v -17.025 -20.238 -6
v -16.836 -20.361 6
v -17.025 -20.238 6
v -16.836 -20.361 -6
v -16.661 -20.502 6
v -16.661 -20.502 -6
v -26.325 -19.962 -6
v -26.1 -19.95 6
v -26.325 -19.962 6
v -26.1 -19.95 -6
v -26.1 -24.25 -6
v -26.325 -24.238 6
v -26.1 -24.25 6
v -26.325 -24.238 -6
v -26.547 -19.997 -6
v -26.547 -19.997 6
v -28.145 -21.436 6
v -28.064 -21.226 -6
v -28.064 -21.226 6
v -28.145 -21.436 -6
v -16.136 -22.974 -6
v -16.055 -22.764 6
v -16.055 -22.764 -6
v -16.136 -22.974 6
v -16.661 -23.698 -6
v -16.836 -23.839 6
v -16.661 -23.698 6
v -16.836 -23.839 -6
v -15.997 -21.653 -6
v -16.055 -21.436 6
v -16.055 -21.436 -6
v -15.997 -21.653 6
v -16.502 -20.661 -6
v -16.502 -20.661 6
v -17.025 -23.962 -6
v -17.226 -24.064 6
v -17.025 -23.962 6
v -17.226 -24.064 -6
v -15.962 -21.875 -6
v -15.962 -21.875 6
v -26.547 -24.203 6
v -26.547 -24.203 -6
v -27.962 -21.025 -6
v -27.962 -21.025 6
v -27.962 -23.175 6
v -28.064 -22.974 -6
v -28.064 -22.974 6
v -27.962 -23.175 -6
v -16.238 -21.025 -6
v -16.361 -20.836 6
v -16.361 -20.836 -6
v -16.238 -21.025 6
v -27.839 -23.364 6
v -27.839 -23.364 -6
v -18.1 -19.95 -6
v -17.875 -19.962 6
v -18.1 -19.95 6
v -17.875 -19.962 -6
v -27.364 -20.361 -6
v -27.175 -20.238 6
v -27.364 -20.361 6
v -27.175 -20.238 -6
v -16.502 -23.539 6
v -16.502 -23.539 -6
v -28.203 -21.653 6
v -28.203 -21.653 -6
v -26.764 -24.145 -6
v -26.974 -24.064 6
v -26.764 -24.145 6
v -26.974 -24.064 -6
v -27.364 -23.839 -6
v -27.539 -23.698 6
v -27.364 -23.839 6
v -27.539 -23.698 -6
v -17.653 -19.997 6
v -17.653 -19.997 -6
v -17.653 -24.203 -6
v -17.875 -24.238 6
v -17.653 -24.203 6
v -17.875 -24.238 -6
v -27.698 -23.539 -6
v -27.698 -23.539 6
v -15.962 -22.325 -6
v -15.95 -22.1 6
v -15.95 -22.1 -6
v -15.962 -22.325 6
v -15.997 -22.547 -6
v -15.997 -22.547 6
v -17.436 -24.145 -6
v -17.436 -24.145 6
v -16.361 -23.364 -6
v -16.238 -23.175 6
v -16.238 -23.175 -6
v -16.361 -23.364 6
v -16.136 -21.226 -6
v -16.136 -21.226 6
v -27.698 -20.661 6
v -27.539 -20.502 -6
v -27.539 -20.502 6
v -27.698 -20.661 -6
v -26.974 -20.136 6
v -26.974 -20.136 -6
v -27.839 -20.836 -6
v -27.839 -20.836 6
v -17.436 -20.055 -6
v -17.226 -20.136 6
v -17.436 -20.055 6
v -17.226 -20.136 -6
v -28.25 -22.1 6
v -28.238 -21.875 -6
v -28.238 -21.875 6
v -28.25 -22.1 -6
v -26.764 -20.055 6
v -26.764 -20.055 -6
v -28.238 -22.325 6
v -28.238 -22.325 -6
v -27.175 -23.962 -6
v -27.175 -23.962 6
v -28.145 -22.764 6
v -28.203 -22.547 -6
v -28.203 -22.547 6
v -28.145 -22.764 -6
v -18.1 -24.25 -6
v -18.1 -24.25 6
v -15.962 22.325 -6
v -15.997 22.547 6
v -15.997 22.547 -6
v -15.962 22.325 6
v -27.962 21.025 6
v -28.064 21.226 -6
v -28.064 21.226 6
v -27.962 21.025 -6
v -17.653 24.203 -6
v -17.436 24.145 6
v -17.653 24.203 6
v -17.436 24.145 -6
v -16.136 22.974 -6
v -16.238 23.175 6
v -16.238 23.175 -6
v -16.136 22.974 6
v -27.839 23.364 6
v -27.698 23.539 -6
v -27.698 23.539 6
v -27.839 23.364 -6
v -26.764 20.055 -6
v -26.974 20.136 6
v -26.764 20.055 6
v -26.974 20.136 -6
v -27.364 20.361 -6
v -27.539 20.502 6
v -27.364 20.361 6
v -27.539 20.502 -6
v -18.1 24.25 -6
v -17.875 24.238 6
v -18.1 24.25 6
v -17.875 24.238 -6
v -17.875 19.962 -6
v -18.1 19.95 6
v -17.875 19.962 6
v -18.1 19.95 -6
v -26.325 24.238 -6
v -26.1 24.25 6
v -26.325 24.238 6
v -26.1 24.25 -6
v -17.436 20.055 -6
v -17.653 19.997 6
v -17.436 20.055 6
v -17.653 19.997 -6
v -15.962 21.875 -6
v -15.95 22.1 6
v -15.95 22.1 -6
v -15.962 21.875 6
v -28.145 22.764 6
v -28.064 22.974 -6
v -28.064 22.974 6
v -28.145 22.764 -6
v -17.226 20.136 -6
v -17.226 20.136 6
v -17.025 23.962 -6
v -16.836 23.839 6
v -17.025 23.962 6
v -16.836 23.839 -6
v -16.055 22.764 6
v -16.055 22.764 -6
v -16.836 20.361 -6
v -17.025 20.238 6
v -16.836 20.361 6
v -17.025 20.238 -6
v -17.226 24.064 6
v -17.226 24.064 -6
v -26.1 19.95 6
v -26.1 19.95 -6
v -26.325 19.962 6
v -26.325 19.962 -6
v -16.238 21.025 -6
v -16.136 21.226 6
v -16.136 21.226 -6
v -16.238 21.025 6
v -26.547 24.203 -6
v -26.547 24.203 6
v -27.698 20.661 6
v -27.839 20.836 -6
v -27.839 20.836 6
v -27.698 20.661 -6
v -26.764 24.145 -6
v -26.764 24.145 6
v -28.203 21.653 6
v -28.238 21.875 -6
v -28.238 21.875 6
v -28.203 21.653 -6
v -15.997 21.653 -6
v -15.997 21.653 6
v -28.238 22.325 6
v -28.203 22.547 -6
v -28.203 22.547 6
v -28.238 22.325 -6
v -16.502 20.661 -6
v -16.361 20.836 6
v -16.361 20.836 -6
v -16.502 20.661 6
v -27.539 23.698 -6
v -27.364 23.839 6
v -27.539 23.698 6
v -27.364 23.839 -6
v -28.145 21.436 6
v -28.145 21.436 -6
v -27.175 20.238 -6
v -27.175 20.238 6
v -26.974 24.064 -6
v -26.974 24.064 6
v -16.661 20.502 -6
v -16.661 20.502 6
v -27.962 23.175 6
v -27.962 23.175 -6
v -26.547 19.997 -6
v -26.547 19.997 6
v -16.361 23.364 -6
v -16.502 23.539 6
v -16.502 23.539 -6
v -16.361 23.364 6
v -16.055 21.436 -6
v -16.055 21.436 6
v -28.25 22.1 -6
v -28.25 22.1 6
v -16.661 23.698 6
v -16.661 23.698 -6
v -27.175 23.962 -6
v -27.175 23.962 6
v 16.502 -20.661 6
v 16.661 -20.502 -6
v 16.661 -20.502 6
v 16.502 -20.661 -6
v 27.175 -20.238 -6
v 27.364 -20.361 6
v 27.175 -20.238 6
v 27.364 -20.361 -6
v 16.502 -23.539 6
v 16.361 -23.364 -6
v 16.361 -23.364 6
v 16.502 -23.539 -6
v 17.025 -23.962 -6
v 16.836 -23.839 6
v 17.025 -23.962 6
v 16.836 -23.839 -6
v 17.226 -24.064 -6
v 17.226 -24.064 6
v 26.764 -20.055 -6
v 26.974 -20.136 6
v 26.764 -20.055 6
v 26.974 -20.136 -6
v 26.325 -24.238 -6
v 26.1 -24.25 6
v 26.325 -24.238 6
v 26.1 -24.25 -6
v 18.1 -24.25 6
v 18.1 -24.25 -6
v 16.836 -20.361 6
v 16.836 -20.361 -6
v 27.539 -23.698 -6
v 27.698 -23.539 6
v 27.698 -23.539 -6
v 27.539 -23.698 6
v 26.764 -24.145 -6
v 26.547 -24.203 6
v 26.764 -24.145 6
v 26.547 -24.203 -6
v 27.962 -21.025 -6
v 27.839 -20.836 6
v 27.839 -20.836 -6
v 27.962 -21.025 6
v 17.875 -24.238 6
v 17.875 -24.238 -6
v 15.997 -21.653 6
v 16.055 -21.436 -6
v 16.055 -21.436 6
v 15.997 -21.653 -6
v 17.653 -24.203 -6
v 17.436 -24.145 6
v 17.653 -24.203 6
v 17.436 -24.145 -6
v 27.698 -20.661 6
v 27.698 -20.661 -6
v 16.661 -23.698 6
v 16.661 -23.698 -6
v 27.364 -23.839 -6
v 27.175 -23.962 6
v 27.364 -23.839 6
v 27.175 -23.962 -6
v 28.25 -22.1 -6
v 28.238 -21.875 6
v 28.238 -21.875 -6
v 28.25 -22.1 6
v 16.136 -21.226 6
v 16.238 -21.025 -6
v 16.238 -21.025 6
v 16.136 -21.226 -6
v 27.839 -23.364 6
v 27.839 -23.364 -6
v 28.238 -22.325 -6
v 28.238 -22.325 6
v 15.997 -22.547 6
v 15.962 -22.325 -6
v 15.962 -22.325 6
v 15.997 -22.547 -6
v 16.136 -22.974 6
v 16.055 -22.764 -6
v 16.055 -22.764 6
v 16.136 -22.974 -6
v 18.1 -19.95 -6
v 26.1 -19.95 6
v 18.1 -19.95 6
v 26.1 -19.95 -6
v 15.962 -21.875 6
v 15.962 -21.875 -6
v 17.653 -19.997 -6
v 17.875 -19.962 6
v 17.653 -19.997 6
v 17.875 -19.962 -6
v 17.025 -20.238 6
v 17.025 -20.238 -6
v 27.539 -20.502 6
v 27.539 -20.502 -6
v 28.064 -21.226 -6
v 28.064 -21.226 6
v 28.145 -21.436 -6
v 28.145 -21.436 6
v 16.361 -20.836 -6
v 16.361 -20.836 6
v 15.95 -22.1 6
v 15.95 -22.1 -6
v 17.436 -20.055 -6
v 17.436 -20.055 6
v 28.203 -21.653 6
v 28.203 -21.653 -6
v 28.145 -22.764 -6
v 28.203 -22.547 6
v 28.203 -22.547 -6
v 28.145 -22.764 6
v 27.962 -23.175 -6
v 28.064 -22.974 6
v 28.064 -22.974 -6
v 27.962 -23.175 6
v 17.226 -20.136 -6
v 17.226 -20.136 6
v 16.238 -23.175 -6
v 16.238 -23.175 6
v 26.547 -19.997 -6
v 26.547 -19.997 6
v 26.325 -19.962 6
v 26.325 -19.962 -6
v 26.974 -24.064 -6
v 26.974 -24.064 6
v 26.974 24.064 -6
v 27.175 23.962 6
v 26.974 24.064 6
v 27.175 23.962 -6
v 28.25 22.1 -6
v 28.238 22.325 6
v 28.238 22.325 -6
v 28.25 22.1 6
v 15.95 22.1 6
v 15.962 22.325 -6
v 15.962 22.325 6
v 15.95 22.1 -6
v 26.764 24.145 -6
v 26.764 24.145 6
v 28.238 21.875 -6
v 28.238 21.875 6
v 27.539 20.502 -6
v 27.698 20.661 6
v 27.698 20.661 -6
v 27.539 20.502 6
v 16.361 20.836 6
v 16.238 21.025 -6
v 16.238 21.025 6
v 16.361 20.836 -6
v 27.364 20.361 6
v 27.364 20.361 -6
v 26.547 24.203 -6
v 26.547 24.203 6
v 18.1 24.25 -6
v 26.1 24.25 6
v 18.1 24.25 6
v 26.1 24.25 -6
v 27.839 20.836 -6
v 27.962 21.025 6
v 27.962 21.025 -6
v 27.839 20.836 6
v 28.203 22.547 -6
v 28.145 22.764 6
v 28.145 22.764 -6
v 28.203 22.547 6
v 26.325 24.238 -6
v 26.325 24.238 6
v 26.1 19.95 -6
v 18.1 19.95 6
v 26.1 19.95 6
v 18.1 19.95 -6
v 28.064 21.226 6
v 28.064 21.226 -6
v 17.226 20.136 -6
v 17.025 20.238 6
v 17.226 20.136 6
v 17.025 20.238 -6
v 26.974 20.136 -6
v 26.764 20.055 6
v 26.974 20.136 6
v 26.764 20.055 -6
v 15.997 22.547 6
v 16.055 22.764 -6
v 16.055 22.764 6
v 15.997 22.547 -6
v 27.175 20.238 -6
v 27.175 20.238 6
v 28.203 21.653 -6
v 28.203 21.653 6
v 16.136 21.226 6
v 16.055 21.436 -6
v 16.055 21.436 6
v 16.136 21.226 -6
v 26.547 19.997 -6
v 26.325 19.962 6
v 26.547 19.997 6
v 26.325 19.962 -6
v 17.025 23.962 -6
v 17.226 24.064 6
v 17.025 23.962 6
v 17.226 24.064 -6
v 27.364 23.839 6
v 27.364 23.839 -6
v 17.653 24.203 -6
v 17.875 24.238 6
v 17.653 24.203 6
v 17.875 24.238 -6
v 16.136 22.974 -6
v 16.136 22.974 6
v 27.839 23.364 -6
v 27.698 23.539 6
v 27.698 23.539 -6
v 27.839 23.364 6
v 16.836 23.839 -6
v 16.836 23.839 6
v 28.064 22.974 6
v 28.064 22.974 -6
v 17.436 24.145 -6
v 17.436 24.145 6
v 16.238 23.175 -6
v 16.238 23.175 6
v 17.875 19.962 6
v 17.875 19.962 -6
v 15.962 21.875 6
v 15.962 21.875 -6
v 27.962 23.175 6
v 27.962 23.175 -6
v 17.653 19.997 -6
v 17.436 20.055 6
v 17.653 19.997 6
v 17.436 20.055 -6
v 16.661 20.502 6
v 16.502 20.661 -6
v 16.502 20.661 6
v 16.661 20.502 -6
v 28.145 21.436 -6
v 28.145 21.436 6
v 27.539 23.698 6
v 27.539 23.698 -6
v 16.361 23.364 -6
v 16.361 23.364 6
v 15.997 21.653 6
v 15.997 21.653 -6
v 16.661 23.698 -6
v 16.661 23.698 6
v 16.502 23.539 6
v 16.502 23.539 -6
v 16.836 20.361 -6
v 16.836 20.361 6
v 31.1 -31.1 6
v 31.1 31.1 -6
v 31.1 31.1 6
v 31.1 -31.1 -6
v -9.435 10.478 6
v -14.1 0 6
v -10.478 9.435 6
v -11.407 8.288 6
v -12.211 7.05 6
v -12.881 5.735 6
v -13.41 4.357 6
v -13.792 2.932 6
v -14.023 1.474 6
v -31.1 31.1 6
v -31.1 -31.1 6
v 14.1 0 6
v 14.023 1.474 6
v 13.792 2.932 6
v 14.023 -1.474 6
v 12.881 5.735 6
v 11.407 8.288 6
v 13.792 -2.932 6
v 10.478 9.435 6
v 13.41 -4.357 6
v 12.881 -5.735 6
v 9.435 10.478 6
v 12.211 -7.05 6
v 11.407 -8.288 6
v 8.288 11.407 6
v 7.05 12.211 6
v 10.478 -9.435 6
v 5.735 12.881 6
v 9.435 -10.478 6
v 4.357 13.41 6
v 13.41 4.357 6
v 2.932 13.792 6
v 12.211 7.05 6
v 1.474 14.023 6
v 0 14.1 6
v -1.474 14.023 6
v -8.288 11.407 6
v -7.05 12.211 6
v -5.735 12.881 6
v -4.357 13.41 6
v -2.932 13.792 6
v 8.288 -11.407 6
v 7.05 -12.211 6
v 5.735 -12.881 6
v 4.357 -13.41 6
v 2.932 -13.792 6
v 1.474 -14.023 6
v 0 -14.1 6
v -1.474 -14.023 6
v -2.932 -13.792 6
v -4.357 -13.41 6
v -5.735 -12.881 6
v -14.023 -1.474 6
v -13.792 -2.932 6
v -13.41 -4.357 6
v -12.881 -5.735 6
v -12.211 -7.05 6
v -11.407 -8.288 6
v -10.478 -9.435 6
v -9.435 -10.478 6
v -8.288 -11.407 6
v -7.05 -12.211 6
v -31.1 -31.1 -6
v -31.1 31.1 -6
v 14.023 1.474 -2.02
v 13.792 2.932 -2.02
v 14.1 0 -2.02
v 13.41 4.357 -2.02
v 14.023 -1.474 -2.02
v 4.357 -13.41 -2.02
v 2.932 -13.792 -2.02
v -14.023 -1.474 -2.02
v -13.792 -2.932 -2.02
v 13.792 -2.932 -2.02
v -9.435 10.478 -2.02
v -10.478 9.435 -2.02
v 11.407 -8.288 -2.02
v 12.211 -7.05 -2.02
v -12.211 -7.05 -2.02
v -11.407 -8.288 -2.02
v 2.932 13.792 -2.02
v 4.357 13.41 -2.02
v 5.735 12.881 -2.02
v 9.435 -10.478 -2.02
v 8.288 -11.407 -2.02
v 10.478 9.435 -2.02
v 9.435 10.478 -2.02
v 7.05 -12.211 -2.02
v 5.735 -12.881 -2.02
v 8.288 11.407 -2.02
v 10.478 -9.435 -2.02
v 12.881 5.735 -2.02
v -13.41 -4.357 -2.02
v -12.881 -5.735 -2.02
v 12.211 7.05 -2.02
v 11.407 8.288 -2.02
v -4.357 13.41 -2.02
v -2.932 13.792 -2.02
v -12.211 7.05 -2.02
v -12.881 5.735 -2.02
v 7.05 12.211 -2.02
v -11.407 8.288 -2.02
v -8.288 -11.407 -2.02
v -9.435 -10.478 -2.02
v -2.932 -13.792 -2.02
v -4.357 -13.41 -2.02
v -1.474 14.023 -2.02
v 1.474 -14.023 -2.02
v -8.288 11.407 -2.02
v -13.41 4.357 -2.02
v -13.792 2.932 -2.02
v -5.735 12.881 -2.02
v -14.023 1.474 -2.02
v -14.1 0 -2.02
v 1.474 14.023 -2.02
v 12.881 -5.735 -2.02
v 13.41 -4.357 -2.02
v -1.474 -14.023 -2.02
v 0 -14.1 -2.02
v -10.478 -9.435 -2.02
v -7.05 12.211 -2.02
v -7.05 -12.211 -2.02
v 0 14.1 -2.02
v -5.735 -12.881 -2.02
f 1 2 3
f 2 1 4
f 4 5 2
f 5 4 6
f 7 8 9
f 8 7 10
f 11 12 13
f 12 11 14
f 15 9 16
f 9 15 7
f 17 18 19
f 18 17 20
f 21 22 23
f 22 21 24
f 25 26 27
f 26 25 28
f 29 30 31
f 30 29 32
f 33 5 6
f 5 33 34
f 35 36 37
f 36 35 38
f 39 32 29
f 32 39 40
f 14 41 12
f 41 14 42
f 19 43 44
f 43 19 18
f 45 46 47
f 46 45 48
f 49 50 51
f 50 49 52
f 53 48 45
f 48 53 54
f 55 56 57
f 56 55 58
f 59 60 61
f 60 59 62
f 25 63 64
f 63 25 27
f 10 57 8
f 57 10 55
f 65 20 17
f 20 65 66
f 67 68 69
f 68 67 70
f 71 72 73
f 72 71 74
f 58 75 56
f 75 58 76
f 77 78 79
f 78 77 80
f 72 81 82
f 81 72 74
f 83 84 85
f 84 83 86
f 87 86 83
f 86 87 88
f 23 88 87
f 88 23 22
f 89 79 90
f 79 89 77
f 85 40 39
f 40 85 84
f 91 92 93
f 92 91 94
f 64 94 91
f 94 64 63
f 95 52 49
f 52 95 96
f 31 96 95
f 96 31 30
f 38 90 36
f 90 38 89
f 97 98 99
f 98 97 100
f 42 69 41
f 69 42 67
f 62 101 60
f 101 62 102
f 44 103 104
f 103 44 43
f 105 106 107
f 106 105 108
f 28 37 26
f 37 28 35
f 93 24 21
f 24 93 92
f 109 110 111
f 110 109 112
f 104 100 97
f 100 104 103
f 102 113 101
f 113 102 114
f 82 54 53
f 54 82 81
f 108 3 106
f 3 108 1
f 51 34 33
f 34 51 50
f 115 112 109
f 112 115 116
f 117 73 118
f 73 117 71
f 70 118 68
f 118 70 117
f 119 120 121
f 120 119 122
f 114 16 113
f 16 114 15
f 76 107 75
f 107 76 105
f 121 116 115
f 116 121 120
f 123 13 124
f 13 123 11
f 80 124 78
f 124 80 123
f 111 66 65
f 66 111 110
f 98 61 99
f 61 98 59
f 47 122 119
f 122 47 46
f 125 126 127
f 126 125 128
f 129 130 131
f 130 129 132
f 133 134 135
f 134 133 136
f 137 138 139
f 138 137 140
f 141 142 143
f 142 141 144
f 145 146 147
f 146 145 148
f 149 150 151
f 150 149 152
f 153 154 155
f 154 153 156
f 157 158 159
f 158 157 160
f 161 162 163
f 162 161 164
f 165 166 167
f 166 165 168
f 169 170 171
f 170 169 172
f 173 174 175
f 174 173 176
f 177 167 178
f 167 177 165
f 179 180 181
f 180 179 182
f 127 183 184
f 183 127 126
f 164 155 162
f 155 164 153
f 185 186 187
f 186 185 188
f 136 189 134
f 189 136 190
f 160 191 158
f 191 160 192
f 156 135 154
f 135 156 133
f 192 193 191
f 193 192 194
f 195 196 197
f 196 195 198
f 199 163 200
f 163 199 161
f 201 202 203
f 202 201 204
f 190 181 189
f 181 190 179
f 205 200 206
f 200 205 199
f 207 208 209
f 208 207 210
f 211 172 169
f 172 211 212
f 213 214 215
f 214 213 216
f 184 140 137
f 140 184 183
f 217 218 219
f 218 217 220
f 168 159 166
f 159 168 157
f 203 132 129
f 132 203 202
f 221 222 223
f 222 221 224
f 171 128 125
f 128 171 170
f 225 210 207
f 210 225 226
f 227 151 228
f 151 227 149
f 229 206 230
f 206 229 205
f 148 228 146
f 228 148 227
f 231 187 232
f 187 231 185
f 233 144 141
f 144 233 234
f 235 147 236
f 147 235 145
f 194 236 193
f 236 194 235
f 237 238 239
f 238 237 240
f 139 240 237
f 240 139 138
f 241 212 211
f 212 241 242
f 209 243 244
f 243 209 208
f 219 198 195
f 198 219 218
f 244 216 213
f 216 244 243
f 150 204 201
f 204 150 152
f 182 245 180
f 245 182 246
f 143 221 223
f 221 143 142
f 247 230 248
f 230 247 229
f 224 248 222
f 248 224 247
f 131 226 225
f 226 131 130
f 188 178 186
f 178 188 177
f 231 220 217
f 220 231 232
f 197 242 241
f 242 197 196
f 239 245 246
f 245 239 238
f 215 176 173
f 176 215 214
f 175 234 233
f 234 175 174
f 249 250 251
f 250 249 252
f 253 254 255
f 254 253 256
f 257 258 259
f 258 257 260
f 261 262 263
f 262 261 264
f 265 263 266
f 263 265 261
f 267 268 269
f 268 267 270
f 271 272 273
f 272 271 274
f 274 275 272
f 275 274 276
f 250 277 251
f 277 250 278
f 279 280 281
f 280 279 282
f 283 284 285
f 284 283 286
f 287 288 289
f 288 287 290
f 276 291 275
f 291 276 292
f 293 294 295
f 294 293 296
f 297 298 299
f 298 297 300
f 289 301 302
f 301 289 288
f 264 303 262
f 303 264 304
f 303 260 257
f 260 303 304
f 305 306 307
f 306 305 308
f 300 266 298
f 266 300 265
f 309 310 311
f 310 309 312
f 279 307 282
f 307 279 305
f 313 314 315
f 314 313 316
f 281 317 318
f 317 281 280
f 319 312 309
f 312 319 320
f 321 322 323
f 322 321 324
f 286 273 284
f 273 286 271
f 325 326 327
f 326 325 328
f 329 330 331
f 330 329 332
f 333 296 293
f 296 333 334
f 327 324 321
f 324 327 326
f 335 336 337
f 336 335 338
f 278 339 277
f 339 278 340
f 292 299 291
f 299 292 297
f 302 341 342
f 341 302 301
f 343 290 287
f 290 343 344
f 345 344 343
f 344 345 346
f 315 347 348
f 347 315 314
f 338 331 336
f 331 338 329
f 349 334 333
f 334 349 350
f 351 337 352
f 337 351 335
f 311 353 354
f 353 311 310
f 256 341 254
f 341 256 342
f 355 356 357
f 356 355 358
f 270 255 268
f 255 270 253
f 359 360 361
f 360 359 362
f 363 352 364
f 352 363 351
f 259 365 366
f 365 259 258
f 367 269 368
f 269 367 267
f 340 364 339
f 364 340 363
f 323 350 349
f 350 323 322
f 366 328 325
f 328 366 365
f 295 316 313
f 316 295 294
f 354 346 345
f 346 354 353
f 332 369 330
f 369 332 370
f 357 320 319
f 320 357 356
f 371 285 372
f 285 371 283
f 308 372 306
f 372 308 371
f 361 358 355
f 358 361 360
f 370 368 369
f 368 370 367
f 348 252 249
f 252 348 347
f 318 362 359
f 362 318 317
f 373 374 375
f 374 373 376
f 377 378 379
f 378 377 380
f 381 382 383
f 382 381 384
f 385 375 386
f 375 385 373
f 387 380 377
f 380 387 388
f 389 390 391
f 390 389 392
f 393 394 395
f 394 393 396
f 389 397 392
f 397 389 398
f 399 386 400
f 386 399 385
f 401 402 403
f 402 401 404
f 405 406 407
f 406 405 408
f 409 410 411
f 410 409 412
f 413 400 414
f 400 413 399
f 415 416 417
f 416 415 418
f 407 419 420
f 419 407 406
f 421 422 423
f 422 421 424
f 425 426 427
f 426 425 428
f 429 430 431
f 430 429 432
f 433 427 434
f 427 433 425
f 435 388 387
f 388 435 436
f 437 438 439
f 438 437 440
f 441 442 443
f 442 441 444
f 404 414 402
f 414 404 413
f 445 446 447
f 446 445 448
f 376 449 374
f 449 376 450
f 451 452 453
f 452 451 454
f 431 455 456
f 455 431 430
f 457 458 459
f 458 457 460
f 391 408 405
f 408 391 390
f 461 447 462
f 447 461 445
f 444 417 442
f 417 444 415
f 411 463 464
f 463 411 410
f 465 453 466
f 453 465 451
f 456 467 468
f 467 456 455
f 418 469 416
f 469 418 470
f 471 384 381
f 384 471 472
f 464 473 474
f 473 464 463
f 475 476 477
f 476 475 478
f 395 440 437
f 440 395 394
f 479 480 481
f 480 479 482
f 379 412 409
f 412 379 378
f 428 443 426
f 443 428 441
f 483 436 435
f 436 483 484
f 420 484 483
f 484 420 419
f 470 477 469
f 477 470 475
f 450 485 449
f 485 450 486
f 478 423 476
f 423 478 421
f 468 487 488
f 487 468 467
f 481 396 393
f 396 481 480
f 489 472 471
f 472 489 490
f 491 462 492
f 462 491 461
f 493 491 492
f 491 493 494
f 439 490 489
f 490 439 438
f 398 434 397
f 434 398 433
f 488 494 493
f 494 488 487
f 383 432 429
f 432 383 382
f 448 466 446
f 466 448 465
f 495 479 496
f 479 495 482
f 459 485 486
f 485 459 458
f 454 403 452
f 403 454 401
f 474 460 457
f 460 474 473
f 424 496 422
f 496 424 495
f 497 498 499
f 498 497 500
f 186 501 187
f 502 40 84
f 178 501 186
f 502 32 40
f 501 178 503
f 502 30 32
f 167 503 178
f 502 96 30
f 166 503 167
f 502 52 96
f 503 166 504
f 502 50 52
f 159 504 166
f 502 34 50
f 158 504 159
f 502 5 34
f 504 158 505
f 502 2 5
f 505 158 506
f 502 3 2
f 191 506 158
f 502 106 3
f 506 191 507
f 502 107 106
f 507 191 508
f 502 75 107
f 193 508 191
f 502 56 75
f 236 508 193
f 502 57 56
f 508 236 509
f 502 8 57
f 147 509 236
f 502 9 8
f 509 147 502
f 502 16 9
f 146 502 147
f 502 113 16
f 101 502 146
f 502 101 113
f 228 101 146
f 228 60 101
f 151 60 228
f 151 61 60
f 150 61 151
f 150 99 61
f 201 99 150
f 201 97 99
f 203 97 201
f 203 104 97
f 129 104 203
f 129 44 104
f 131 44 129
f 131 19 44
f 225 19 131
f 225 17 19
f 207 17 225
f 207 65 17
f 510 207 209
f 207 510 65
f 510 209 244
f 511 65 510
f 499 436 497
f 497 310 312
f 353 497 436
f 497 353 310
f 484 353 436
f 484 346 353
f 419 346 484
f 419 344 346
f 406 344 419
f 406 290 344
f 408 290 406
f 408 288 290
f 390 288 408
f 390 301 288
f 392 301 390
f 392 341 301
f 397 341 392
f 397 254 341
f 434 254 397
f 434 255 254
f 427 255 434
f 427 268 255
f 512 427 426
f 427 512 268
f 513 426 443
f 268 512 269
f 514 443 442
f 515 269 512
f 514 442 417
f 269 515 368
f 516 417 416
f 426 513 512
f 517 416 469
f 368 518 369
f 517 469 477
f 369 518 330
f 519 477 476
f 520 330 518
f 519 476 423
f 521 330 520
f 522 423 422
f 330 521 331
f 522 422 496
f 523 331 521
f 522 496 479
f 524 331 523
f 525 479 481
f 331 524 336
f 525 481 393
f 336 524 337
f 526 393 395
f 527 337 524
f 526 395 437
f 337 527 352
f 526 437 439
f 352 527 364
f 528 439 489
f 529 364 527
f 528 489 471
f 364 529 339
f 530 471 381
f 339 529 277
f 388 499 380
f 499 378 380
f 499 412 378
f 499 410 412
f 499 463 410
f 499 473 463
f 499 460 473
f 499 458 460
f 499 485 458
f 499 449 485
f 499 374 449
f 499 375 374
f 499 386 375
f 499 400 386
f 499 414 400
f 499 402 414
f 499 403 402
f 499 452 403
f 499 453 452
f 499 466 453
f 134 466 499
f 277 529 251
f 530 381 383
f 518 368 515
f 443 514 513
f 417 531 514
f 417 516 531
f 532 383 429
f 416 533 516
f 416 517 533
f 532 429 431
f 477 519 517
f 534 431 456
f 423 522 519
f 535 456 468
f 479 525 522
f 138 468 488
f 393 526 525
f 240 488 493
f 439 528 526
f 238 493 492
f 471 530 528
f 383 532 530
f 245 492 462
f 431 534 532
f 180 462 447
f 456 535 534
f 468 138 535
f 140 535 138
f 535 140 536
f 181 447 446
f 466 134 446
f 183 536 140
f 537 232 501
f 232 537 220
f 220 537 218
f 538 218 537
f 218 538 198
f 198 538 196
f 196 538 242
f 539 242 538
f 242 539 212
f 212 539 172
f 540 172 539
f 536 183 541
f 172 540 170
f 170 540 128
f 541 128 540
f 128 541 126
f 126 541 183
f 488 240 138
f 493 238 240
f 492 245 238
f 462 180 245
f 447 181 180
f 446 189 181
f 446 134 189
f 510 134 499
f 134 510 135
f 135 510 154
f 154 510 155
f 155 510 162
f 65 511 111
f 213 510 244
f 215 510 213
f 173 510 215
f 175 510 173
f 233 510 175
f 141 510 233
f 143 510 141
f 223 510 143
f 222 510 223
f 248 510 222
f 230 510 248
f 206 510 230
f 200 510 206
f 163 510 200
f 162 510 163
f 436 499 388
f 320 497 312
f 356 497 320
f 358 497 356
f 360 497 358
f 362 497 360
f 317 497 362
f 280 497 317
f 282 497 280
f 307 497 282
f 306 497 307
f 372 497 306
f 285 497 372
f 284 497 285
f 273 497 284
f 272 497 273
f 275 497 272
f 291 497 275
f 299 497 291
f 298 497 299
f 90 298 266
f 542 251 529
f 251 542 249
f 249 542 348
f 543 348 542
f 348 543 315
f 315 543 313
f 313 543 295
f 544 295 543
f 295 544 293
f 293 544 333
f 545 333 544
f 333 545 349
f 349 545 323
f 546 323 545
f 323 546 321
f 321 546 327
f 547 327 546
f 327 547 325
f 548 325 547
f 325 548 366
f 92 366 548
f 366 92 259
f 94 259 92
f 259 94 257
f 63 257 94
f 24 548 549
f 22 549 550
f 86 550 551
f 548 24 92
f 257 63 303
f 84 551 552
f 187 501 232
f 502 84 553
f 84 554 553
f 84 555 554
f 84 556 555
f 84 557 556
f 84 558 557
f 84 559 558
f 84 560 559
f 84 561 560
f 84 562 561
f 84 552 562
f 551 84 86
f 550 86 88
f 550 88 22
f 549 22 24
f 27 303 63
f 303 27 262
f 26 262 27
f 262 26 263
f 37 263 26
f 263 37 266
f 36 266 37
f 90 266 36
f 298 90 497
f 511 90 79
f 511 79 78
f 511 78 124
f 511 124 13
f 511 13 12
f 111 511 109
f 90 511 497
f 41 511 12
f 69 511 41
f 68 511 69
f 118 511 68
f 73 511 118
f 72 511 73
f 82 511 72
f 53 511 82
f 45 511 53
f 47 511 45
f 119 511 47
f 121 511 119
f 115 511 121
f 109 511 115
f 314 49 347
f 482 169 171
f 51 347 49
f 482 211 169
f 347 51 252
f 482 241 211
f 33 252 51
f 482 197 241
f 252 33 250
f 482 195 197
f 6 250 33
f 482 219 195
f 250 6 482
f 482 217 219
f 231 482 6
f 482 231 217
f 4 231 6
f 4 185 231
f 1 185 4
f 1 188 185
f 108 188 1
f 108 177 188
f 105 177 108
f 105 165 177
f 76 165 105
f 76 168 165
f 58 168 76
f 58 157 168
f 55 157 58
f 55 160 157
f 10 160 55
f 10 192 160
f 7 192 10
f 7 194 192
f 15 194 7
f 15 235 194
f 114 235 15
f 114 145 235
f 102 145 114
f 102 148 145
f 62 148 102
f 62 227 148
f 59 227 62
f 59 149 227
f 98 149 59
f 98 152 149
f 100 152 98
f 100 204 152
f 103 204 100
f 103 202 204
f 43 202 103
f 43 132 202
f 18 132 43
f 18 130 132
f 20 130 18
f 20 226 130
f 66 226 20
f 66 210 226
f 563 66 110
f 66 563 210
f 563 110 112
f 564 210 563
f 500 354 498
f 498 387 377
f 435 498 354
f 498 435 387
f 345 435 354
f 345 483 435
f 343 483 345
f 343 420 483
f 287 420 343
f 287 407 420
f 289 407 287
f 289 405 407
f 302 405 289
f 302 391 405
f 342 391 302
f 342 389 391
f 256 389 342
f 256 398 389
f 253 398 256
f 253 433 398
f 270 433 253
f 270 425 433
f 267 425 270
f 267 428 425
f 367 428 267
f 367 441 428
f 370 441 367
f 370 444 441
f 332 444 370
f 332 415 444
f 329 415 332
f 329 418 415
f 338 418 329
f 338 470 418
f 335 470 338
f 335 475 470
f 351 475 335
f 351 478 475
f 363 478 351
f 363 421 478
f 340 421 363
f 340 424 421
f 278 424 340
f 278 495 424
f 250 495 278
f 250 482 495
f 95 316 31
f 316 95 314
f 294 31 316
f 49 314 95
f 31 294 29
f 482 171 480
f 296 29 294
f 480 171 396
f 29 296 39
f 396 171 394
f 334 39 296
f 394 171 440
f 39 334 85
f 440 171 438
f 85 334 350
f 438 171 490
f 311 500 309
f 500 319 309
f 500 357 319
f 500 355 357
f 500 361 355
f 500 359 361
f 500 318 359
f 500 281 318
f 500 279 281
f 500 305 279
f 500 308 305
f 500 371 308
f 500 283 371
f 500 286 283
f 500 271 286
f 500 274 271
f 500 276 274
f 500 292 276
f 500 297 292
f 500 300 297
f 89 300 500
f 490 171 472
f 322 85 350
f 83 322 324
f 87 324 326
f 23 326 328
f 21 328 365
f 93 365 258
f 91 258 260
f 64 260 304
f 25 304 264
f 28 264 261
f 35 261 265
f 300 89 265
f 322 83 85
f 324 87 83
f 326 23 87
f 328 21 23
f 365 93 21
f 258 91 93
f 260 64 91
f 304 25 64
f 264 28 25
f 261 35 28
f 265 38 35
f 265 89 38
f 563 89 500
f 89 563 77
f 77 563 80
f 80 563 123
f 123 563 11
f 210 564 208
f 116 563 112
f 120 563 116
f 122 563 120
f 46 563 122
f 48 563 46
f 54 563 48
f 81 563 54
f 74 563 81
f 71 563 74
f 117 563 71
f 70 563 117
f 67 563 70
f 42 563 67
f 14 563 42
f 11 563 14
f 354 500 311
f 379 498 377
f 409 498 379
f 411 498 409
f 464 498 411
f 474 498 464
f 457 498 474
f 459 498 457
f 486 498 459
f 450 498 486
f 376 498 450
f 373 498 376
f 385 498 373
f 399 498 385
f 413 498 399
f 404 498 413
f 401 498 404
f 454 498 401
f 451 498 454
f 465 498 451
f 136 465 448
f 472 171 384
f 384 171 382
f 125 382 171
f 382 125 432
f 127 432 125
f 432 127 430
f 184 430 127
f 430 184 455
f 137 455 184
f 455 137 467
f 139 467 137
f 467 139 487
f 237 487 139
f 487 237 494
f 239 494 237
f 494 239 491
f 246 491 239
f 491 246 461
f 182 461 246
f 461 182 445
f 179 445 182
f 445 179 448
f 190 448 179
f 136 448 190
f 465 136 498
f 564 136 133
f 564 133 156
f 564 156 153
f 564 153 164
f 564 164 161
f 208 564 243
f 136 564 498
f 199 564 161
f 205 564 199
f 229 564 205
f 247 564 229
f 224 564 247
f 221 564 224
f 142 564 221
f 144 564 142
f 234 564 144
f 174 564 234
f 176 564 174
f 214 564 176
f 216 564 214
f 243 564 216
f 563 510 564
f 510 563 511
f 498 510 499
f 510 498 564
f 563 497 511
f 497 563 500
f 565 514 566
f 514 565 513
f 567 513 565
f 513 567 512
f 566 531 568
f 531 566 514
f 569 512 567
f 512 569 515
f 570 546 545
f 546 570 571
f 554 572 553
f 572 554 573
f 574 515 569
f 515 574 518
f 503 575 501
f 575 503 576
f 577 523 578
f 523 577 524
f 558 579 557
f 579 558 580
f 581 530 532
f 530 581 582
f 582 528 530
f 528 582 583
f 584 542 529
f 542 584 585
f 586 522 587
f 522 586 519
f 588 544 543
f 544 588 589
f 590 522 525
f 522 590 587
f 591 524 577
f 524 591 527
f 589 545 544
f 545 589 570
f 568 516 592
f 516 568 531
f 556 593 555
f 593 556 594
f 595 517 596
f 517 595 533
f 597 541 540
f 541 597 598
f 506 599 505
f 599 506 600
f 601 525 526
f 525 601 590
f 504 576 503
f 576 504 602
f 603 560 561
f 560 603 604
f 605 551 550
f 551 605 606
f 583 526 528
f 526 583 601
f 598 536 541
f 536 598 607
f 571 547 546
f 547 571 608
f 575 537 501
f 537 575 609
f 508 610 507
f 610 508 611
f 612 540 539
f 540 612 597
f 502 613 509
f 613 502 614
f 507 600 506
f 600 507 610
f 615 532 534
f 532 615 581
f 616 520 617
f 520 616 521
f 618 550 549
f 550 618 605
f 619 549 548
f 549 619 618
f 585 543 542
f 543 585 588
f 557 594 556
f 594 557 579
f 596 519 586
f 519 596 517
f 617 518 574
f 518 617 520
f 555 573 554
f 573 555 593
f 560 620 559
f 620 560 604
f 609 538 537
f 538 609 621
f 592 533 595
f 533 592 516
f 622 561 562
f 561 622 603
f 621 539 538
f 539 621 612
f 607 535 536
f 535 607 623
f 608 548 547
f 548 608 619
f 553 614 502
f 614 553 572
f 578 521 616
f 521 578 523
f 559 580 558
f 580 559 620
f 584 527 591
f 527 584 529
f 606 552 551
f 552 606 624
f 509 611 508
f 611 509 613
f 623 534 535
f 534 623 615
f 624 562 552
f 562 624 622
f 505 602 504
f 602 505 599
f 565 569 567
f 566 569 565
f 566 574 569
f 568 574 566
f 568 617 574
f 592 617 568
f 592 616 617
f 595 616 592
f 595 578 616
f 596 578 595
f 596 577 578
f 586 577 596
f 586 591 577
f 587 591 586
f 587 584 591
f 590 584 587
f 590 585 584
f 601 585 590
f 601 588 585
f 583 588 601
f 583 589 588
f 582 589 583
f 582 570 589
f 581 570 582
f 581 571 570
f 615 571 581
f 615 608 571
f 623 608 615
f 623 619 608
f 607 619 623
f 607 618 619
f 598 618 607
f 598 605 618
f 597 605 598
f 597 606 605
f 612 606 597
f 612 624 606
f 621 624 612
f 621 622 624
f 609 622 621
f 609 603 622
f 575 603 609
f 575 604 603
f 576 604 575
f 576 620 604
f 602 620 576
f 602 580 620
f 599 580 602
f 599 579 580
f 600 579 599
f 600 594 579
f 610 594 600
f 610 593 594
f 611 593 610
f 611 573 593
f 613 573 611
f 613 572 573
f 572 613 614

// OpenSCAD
// Bearing mounting plate with 28.2 mm pocket.
$fn = 60;
eps = 0.02;
plate_w = 62.2;
plate_t = 12;
bearing_d = 28.2;
pocket_d = 8;
mount_pitch = 44.2;
module slot(x, y) {
    hull() {
        translate([x - 4, y, -plate_t / 2 - eps]) cylinder(d = 4.3, h = plate_t + 2 * eps);
        translate([x + 4, y, -plate_t / 2 - eps]) cylinder(d = 4.3, h = plate_t + 2 * eps);
    }
}
difference() {
    cube([plate_w, plate_w, plate_t], center = true);
    translate([0, 0, plate_t / 2 - pocket_d - eps]) cylinder(d = bearing_d, h = pocket_d + 2 * eps);
    for (x = [-mount_pitch / 2, mount_pitch / 2], y = [-mount_pitch / 2, mount_pitch / 2]) slot(x, y);
}
